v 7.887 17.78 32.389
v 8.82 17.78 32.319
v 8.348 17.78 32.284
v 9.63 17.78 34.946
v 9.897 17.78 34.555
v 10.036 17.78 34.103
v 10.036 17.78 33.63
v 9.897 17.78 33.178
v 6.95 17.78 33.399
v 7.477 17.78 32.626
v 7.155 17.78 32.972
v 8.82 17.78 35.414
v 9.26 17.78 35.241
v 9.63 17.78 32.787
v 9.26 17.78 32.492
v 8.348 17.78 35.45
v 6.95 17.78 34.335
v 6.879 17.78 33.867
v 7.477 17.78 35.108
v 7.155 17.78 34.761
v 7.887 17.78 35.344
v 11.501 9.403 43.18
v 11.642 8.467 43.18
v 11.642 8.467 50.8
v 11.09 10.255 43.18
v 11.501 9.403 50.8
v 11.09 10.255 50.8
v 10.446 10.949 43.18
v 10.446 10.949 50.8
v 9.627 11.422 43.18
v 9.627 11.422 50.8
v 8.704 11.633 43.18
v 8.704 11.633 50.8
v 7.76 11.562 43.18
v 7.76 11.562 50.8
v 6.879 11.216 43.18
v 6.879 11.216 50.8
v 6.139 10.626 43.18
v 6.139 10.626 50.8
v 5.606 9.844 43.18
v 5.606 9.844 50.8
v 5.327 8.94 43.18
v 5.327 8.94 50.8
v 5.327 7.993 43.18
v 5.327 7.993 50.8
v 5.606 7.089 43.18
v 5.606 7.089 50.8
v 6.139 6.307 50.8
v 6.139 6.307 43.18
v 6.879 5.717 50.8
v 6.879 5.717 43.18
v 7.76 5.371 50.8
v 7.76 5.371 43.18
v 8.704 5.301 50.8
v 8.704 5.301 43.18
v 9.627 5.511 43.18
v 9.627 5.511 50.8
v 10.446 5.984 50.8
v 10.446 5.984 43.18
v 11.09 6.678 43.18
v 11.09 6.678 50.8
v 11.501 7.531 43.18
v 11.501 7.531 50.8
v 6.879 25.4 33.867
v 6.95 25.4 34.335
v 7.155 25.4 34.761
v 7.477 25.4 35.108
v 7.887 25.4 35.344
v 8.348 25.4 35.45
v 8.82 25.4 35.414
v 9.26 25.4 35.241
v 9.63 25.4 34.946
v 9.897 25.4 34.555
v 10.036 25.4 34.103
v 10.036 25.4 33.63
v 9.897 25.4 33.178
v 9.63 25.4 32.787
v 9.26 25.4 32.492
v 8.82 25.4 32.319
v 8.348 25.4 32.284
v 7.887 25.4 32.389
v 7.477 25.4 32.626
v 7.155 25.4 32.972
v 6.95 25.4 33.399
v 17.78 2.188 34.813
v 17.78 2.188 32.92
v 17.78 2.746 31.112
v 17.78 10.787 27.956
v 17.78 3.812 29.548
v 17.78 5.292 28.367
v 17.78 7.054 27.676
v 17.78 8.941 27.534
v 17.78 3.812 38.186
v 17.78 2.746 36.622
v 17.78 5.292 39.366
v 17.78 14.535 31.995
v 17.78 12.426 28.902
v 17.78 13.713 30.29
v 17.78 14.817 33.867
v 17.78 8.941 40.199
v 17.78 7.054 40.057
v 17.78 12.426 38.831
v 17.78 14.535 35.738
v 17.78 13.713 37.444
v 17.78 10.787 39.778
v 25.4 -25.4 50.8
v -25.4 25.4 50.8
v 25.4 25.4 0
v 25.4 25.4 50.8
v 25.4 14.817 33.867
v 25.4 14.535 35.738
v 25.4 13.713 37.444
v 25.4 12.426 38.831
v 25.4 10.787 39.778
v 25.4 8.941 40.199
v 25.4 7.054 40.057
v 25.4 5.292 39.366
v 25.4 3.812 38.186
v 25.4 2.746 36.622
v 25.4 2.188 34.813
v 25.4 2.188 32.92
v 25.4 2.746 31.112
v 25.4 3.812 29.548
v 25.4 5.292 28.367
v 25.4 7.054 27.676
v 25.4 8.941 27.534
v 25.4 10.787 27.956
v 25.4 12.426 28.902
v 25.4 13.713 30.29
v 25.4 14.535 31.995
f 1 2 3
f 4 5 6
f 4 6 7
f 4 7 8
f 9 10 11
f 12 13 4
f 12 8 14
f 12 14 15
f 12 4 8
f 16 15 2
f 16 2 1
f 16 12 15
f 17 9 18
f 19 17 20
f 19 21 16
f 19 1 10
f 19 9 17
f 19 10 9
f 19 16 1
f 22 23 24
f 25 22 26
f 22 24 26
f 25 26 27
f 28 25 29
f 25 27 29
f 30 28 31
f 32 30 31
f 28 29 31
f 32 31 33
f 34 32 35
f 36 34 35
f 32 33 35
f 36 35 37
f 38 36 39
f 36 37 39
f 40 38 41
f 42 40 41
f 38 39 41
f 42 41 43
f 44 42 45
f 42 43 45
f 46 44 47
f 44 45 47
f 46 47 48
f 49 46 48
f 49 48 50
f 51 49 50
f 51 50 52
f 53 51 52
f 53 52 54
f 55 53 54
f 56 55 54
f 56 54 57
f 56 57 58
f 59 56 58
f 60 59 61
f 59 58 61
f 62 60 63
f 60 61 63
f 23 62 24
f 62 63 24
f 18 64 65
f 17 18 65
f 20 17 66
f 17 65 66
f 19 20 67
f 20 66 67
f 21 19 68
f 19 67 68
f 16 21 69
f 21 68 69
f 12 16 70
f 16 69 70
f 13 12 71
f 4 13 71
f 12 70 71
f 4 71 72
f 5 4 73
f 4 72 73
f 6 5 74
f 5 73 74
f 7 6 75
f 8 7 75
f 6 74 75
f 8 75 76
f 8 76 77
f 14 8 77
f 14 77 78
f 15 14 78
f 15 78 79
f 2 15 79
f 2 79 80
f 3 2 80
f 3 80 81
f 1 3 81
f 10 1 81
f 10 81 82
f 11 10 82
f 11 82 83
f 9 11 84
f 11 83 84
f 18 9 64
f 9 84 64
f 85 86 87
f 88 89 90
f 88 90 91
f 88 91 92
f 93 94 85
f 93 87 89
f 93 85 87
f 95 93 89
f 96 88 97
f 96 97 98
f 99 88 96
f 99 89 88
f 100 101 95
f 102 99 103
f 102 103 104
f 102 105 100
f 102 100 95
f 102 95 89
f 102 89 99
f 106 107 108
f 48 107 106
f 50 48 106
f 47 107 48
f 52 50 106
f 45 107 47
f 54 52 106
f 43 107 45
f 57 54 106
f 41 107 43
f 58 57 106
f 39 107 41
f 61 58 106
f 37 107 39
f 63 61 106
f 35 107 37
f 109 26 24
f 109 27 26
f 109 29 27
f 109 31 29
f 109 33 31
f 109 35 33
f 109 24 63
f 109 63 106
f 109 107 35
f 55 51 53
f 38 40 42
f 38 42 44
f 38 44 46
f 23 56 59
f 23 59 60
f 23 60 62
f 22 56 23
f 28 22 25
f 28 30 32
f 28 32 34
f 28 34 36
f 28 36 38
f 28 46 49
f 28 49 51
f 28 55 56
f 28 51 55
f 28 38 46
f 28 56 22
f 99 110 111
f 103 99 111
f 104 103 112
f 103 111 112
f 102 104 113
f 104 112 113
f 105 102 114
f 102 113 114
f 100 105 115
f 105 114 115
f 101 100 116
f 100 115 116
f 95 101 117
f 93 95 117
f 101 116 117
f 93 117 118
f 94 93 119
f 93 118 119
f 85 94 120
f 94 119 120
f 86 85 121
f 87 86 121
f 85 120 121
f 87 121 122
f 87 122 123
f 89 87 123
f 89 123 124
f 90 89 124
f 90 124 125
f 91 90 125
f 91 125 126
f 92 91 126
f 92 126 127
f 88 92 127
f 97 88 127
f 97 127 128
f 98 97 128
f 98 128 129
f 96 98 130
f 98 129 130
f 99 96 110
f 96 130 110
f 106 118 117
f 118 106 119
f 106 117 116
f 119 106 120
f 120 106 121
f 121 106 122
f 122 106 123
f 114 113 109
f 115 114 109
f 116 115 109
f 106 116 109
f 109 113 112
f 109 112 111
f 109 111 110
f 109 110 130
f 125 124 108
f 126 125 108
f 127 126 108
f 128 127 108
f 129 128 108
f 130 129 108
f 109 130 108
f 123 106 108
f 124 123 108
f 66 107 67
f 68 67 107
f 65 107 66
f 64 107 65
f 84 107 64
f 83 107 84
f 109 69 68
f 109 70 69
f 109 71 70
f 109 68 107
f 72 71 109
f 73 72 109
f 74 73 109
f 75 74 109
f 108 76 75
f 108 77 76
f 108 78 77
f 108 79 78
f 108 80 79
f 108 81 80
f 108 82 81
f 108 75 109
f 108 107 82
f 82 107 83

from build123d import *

# Parameters (mm, degrees)
F0_W      = 50.8
F0_H      = 50.8
F1_DEPTH  = 50.8
F4_DEPTH  = 58.6597873497
F5_R      = 6.35
F8_DEPTH  = 7.62
F6_R      = 3.175
F9_DEPTH  = 7.62
F7_R      = 1.5875
F10_DEPTH = 7.62


with BuildPart() as f1:
    # F0 (on Top) → F1 (new body)
    with BuildSketch(Plane.XY):
        Rectangle(F0_W, F0_H)
    extrude(amount=F1_DEPTH)

    # F3 (on 3pt) → F4 (cut, through all)
    with BuildSketch(Plane(origin=(16.9333333333, 16.9333333333, 16.9333333333), x_dir=(0.8164965809, -0.4082482905, -0.4082482905), z_dir=(-0.5773502692, -0.5773502692, -0.5773502692))):
        Polygon((-51.8475328889, 17.9605122421), (-31.1085197333, -17.9605122421), (10.3695065778, -17.9605122421), (31.1085197333, 17.9605122421), (10.3695065778, 53.8815367264), (-31.1085197333, 53.8815367264), align=None)
    extrude(amount=F4_DEPTH, mode=Mode.SUBTRACT)

    # F5 (on face) → F8 (cut)
    with BuildSketch(Plane.YZ.offset(25.4)):
        with Locations((8.4666666667, 33.8666666667)):
            Circle(F5_R)
    extrude(amount=-F8_DEPTH, mode=Mode.SUBTRACT)

    # F6 (on face) → F9 (cut)
    with BuildSketch(Plane.XY.offset(50.8)):
        with Locations((8.4666666667, 8.4666666667)):
            Circle(F6_R)
    extrude(amount=-F9_DEPTH, mode=Mode.SUBTRACT)

    # F7 (on face) → F10 (cut)
    with BuildSketch(Plane(origin=(0, 25.4, 0), x_dir=(-1, 0, 0), z_dir=(0, 1, 0))):
        with Locations((-8.4666666667, 33.8666666667)):
            Circle(F7_R)
    extrude(amount=-F10_DEPTH, mode=Mode.SUBTRACT)


solid = f1.part
